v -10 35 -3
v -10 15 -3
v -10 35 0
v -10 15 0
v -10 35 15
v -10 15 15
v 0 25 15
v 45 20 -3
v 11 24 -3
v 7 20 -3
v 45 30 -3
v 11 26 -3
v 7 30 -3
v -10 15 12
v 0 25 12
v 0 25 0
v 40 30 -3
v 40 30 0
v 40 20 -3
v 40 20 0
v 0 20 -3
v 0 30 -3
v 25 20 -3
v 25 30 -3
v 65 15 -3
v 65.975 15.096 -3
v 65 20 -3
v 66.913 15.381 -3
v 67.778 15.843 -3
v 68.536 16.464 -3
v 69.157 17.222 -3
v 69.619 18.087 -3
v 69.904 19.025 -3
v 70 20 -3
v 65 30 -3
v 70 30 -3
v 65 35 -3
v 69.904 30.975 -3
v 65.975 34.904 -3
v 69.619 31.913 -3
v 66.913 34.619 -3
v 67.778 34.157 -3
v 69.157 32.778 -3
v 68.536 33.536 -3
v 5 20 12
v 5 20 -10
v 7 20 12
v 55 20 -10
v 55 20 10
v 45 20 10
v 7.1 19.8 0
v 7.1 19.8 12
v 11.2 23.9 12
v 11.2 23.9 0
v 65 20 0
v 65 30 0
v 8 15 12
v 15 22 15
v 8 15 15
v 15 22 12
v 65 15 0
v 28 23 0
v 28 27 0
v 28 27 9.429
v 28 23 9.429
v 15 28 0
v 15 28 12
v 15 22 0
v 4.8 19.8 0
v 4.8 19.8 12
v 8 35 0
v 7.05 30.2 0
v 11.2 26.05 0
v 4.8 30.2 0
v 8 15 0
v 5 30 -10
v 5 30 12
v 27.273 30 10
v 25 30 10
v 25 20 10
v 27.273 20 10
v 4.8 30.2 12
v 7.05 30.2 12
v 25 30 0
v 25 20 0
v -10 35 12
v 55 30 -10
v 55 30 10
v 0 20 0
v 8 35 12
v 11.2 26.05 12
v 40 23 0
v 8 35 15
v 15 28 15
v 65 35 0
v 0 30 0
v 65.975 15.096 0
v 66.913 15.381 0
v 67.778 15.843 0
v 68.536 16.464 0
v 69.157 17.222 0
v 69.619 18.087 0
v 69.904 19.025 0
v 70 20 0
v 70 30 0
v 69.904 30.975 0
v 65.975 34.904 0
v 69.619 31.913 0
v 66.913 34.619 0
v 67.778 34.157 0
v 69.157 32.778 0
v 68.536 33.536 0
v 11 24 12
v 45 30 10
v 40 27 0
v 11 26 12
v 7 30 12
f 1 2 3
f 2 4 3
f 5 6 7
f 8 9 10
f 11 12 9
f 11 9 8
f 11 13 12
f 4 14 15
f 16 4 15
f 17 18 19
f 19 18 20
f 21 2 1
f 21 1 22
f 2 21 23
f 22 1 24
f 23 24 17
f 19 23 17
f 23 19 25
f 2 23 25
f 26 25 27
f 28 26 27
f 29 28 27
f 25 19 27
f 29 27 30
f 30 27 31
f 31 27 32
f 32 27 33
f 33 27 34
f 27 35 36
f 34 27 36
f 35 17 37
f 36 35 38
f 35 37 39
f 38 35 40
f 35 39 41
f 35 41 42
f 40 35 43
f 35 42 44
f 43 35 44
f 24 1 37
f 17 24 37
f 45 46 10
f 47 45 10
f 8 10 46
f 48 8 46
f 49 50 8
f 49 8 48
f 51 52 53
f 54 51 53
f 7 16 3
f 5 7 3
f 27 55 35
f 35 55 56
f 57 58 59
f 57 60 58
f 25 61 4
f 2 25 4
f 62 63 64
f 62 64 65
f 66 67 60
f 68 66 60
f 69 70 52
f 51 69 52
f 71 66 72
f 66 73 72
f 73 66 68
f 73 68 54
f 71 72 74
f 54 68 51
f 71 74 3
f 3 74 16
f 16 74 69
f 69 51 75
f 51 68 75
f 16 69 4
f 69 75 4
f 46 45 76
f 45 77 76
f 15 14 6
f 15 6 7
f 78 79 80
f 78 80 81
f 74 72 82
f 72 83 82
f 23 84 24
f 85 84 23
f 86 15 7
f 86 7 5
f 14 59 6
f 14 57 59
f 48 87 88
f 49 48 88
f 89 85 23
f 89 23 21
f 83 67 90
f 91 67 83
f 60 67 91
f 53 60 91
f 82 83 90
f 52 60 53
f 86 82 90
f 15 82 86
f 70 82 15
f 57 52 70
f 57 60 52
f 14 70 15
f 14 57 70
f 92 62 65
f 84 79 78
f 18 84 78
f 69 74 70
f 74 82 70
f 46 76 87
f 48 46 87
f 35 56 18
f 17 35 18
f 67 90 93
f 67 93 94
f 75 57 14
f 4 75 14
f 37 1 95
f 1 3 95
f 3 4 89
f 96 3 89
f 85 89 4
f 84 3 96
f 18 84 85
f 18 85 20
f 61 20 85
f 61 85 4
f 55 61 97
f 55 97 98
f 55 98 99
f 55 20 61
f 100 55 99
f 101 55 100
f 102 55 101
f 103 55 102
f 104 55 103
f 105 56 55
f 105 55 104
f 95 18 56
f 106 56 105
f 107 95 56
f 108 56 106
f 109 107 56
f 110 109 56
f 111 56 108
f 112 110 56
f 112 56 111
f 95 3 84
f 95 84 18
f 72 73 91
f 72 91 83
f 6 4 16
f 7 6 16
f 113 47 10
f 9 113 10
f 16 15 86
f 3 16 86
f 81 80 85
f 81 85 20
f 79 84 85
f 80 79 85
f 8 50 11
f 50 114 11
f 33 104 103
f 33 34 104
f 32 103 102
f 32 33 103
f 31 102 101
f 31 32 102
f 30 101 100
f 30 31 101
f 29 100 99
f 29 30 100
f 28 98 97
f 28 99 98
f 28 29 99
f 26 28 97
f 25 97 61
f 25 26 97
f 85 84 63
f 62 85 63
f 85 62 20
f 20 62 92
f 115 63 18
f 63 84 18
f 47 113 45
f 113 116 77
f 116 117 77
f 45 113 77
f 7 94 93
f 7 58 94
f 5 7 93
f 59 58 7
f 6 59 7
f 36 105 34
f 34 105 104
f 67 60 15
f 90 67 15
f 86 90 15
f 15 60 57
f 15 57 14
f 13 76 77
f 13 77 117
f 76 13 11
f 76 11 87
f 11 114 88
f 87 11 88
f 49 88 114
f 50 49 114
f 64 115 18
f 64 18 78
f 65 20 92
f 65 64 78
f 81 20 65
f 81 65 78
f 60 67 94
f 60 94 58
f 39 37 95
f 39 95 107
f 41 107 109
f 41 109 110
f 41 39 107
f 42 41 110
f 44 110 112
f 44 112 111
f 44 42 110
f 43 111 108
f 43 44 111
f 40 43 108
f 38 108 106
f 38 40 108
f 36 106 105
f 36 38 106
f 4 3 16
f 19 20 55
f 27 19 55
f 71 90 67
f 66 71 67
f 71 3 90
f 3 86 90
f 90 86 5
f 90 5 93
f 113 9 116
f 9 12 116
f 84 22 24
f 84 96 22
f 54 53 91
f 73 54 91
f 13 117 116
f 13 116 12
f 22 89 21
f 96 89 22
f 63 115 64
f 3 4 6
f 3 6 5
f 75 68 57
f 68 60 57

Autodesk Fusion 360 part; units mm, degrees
sketch "Sketch1" plane through (0, 0, 0) normal (0, 0, 1) x (1, 0, 0) in component "inner-clamp"
  line L0 (-10, 35) -> (70, 35)
  line L1 (70, 35) -> (70, 15)
  line L2 (70, 15) -> (-10, 15)
  line L3 (-10, 15) -> (-10, 35)
  line L4 (25, 30) -> (25, 20)
  line L5 (-10, 15) -> (0, 25)
  line L6 (0, 25) -> (-10, 35)
  line L7 (0, 30) -> (25, 30)
  line L8 (25, 30) -> (25, 20)
  line L9 (25, 20) -> (0, 20)
  line L10 (0, 20) -> (0, 30)
  line L11 (65, 30) -> (40, 30)
  line L12 (40, 30) -> (40, 20)
  line L13 (40, 20) -> (65, 20)
  line L14 (65, 20) -> (65, 30)
  line L15 (25, 30) -> (70, 30)
  line L16 (25, 20) -> (70, 20)
  line L17 (40, 27) -> (28, 27)
  line L18 (28, 27) -> (28, 23)
  line L19 (28, 23) -> (40, 23)
extrude "Extrude3" add sketch "Sketch1" along normal blind 10 contours L4 L8 L12 L15 L16 L17 L18 L19 makes body 1 in component "inner-clamp"
extrude "Extrude2" add sketch "Sketch1" along normal blind 15 separate body contours L3 L5 L6 makes body 2 in component "inner-clamp"
extrude "Extrude1" add sketch "Sketch1" against normal blind 3 separate body contours L3 L5 L6 | L0 L1 L6 L7 L10 L11 L15 | L1 L2 L5 L9 L10 L13 L16 | L1 L14 L15 L16 | L4 L8 L12 L15 L16 L17 L18 L19 | L12 L17 L18 L19 makes body 3 in component "inner-clamp"
fillet "Fillet1" radius 5 2 edges at (70, 15, -1.5) (70, 35, -1.5) on bodies 3 in component "inner-clamp"
sketch "Sketch2" plane through (0, 30, 0) normal (0, -1, 0) x (1, 0, 0) in component "outer-clamp-slider"
  line L0 (25, 0) -> (0, 0)
  line L1 (0, 0) -> (0, -3)
  line L2 (0, -3) -> (25, -3)
  line L3 (25, -3) -> (25, 0)
  line L4 (5, 12) -> (5, -10)
  line L5 (5, -10) -> (55, -10)
  line L6 (55, -10) -> (55, 10)
  line L7 (55, 10) -> (45, 10)
  line L8 (45, 10) -> (45, -3)
  line L9 (45, -3) -> (11, -3)
  line L10 (11, -3) -> (11, 12)
  line L11 (11, 12) -> (5, 12)
extrude "Extrude1'" add sketch "Sketch2" along normal blind 10 separate body contours L0 L2 L4 L10 | L0 L4 L10 L11 | L2 L4 L5 L6 L7 L8 L9 makes body 4 in component "outer-clamp-slider"
chamfer "Chamfer1" distance 4 angle 45 2 edges at (11, 20, 4.5) (11, 30, 4.5) on bodies 4 in component "outer-clamp-slider"
sketch "Sketch1 (2)" plane through (0, 0, 12) normal (0, 0, 1) x (-1, 0, 0) in component "outer-clamp"
  line L0 (-11, -26) -> (-7, -30)
  line L1 (-7, -30) -> (-5, -30)
  line L2 (-5, -30) -> (-5, -20)
  line L3 (-5, -20) -> (-7, -20)
  line L4 (-7, -20) -> (-11, -24)
  line L5 (-11, -24) -> (-11, -26)
  line L6 (-4.8, -19.8) -> (-7.1, -19.8)
  line L7 (-7.1, -19.8) -> (-11.2, -23.9)
  line L8 (-11.2, -23.9) -> (-11.2, -26.05)
  line L9 (-11.2, -26.05) -> (-7.05, -30.2)
  line L10 (-7.05, -30.2) -> (-4.8, -30.2)
  line L11 (-4.8, -30.2) -> (-4.8, -19.8)
  line L12 (0, -25) -> (10, -35)
  line L13 (10, -35) -> (-8, -35)
  line L14 (-8, -35) -> (-15, -28)
  line L15 (-15, -28) -> (-15, -22)
  line L16 (-15, -22) -> (-8, -15)
  line L17 (-8, -15) -> (10, -15)
  line L18 (10, -15) -> (0, -25)
extrude "Extrude2'" add sketch "Sketch1 (2)" along normal blind 3 separate body contours L0 L1 L2 L3 L4 L5 | L6 L7 L8 L9 L10 L11 | L12 L13 L14 L15 L16 L17 L18 makes body 5 in component "outer-clamp"
extrude "Extrude1''" add sketch "Sketch1 (2)" against normal blind 12 separate body contours L12 L13 L14 L15 L16 L17 L18 makes body 6 in component "outer-clamp"
sketch "Sketch2 (2)" plane through (0, 20, 0) normal (0, -1, 0) x (1, 0, 0) in component "inner-clamp"
  line L0 (25, 0) -> (40, 0)
  line L1 (40, 0) -> (40, 10)
  line L2 (40, 10) -> (25, 10)
  line L3 (25, 10) -> (25, 0)
  line L4 (40, 0) -> (26, 11)
extrude "Extrude4" cut sketch "Sketch2 (2)" against normal blind 10 contours L1 L2 L4 bodies 1 in component "inner-clamp"
component "outer-clamp-slider" placed x (1, 0, 0) y (0, 1, 0) z (0, 0, 1) at (0, 0, 0)
component "inner-clamp" placed x (1, 0, 0) y (0, 1, 0) z (0, 0, 1) at (0, 0, 0)
component "outer-clamp" placed x (1, 0, 0) y (0, 1, 0) z (0, 0, 1) at (0, 0, 0)
